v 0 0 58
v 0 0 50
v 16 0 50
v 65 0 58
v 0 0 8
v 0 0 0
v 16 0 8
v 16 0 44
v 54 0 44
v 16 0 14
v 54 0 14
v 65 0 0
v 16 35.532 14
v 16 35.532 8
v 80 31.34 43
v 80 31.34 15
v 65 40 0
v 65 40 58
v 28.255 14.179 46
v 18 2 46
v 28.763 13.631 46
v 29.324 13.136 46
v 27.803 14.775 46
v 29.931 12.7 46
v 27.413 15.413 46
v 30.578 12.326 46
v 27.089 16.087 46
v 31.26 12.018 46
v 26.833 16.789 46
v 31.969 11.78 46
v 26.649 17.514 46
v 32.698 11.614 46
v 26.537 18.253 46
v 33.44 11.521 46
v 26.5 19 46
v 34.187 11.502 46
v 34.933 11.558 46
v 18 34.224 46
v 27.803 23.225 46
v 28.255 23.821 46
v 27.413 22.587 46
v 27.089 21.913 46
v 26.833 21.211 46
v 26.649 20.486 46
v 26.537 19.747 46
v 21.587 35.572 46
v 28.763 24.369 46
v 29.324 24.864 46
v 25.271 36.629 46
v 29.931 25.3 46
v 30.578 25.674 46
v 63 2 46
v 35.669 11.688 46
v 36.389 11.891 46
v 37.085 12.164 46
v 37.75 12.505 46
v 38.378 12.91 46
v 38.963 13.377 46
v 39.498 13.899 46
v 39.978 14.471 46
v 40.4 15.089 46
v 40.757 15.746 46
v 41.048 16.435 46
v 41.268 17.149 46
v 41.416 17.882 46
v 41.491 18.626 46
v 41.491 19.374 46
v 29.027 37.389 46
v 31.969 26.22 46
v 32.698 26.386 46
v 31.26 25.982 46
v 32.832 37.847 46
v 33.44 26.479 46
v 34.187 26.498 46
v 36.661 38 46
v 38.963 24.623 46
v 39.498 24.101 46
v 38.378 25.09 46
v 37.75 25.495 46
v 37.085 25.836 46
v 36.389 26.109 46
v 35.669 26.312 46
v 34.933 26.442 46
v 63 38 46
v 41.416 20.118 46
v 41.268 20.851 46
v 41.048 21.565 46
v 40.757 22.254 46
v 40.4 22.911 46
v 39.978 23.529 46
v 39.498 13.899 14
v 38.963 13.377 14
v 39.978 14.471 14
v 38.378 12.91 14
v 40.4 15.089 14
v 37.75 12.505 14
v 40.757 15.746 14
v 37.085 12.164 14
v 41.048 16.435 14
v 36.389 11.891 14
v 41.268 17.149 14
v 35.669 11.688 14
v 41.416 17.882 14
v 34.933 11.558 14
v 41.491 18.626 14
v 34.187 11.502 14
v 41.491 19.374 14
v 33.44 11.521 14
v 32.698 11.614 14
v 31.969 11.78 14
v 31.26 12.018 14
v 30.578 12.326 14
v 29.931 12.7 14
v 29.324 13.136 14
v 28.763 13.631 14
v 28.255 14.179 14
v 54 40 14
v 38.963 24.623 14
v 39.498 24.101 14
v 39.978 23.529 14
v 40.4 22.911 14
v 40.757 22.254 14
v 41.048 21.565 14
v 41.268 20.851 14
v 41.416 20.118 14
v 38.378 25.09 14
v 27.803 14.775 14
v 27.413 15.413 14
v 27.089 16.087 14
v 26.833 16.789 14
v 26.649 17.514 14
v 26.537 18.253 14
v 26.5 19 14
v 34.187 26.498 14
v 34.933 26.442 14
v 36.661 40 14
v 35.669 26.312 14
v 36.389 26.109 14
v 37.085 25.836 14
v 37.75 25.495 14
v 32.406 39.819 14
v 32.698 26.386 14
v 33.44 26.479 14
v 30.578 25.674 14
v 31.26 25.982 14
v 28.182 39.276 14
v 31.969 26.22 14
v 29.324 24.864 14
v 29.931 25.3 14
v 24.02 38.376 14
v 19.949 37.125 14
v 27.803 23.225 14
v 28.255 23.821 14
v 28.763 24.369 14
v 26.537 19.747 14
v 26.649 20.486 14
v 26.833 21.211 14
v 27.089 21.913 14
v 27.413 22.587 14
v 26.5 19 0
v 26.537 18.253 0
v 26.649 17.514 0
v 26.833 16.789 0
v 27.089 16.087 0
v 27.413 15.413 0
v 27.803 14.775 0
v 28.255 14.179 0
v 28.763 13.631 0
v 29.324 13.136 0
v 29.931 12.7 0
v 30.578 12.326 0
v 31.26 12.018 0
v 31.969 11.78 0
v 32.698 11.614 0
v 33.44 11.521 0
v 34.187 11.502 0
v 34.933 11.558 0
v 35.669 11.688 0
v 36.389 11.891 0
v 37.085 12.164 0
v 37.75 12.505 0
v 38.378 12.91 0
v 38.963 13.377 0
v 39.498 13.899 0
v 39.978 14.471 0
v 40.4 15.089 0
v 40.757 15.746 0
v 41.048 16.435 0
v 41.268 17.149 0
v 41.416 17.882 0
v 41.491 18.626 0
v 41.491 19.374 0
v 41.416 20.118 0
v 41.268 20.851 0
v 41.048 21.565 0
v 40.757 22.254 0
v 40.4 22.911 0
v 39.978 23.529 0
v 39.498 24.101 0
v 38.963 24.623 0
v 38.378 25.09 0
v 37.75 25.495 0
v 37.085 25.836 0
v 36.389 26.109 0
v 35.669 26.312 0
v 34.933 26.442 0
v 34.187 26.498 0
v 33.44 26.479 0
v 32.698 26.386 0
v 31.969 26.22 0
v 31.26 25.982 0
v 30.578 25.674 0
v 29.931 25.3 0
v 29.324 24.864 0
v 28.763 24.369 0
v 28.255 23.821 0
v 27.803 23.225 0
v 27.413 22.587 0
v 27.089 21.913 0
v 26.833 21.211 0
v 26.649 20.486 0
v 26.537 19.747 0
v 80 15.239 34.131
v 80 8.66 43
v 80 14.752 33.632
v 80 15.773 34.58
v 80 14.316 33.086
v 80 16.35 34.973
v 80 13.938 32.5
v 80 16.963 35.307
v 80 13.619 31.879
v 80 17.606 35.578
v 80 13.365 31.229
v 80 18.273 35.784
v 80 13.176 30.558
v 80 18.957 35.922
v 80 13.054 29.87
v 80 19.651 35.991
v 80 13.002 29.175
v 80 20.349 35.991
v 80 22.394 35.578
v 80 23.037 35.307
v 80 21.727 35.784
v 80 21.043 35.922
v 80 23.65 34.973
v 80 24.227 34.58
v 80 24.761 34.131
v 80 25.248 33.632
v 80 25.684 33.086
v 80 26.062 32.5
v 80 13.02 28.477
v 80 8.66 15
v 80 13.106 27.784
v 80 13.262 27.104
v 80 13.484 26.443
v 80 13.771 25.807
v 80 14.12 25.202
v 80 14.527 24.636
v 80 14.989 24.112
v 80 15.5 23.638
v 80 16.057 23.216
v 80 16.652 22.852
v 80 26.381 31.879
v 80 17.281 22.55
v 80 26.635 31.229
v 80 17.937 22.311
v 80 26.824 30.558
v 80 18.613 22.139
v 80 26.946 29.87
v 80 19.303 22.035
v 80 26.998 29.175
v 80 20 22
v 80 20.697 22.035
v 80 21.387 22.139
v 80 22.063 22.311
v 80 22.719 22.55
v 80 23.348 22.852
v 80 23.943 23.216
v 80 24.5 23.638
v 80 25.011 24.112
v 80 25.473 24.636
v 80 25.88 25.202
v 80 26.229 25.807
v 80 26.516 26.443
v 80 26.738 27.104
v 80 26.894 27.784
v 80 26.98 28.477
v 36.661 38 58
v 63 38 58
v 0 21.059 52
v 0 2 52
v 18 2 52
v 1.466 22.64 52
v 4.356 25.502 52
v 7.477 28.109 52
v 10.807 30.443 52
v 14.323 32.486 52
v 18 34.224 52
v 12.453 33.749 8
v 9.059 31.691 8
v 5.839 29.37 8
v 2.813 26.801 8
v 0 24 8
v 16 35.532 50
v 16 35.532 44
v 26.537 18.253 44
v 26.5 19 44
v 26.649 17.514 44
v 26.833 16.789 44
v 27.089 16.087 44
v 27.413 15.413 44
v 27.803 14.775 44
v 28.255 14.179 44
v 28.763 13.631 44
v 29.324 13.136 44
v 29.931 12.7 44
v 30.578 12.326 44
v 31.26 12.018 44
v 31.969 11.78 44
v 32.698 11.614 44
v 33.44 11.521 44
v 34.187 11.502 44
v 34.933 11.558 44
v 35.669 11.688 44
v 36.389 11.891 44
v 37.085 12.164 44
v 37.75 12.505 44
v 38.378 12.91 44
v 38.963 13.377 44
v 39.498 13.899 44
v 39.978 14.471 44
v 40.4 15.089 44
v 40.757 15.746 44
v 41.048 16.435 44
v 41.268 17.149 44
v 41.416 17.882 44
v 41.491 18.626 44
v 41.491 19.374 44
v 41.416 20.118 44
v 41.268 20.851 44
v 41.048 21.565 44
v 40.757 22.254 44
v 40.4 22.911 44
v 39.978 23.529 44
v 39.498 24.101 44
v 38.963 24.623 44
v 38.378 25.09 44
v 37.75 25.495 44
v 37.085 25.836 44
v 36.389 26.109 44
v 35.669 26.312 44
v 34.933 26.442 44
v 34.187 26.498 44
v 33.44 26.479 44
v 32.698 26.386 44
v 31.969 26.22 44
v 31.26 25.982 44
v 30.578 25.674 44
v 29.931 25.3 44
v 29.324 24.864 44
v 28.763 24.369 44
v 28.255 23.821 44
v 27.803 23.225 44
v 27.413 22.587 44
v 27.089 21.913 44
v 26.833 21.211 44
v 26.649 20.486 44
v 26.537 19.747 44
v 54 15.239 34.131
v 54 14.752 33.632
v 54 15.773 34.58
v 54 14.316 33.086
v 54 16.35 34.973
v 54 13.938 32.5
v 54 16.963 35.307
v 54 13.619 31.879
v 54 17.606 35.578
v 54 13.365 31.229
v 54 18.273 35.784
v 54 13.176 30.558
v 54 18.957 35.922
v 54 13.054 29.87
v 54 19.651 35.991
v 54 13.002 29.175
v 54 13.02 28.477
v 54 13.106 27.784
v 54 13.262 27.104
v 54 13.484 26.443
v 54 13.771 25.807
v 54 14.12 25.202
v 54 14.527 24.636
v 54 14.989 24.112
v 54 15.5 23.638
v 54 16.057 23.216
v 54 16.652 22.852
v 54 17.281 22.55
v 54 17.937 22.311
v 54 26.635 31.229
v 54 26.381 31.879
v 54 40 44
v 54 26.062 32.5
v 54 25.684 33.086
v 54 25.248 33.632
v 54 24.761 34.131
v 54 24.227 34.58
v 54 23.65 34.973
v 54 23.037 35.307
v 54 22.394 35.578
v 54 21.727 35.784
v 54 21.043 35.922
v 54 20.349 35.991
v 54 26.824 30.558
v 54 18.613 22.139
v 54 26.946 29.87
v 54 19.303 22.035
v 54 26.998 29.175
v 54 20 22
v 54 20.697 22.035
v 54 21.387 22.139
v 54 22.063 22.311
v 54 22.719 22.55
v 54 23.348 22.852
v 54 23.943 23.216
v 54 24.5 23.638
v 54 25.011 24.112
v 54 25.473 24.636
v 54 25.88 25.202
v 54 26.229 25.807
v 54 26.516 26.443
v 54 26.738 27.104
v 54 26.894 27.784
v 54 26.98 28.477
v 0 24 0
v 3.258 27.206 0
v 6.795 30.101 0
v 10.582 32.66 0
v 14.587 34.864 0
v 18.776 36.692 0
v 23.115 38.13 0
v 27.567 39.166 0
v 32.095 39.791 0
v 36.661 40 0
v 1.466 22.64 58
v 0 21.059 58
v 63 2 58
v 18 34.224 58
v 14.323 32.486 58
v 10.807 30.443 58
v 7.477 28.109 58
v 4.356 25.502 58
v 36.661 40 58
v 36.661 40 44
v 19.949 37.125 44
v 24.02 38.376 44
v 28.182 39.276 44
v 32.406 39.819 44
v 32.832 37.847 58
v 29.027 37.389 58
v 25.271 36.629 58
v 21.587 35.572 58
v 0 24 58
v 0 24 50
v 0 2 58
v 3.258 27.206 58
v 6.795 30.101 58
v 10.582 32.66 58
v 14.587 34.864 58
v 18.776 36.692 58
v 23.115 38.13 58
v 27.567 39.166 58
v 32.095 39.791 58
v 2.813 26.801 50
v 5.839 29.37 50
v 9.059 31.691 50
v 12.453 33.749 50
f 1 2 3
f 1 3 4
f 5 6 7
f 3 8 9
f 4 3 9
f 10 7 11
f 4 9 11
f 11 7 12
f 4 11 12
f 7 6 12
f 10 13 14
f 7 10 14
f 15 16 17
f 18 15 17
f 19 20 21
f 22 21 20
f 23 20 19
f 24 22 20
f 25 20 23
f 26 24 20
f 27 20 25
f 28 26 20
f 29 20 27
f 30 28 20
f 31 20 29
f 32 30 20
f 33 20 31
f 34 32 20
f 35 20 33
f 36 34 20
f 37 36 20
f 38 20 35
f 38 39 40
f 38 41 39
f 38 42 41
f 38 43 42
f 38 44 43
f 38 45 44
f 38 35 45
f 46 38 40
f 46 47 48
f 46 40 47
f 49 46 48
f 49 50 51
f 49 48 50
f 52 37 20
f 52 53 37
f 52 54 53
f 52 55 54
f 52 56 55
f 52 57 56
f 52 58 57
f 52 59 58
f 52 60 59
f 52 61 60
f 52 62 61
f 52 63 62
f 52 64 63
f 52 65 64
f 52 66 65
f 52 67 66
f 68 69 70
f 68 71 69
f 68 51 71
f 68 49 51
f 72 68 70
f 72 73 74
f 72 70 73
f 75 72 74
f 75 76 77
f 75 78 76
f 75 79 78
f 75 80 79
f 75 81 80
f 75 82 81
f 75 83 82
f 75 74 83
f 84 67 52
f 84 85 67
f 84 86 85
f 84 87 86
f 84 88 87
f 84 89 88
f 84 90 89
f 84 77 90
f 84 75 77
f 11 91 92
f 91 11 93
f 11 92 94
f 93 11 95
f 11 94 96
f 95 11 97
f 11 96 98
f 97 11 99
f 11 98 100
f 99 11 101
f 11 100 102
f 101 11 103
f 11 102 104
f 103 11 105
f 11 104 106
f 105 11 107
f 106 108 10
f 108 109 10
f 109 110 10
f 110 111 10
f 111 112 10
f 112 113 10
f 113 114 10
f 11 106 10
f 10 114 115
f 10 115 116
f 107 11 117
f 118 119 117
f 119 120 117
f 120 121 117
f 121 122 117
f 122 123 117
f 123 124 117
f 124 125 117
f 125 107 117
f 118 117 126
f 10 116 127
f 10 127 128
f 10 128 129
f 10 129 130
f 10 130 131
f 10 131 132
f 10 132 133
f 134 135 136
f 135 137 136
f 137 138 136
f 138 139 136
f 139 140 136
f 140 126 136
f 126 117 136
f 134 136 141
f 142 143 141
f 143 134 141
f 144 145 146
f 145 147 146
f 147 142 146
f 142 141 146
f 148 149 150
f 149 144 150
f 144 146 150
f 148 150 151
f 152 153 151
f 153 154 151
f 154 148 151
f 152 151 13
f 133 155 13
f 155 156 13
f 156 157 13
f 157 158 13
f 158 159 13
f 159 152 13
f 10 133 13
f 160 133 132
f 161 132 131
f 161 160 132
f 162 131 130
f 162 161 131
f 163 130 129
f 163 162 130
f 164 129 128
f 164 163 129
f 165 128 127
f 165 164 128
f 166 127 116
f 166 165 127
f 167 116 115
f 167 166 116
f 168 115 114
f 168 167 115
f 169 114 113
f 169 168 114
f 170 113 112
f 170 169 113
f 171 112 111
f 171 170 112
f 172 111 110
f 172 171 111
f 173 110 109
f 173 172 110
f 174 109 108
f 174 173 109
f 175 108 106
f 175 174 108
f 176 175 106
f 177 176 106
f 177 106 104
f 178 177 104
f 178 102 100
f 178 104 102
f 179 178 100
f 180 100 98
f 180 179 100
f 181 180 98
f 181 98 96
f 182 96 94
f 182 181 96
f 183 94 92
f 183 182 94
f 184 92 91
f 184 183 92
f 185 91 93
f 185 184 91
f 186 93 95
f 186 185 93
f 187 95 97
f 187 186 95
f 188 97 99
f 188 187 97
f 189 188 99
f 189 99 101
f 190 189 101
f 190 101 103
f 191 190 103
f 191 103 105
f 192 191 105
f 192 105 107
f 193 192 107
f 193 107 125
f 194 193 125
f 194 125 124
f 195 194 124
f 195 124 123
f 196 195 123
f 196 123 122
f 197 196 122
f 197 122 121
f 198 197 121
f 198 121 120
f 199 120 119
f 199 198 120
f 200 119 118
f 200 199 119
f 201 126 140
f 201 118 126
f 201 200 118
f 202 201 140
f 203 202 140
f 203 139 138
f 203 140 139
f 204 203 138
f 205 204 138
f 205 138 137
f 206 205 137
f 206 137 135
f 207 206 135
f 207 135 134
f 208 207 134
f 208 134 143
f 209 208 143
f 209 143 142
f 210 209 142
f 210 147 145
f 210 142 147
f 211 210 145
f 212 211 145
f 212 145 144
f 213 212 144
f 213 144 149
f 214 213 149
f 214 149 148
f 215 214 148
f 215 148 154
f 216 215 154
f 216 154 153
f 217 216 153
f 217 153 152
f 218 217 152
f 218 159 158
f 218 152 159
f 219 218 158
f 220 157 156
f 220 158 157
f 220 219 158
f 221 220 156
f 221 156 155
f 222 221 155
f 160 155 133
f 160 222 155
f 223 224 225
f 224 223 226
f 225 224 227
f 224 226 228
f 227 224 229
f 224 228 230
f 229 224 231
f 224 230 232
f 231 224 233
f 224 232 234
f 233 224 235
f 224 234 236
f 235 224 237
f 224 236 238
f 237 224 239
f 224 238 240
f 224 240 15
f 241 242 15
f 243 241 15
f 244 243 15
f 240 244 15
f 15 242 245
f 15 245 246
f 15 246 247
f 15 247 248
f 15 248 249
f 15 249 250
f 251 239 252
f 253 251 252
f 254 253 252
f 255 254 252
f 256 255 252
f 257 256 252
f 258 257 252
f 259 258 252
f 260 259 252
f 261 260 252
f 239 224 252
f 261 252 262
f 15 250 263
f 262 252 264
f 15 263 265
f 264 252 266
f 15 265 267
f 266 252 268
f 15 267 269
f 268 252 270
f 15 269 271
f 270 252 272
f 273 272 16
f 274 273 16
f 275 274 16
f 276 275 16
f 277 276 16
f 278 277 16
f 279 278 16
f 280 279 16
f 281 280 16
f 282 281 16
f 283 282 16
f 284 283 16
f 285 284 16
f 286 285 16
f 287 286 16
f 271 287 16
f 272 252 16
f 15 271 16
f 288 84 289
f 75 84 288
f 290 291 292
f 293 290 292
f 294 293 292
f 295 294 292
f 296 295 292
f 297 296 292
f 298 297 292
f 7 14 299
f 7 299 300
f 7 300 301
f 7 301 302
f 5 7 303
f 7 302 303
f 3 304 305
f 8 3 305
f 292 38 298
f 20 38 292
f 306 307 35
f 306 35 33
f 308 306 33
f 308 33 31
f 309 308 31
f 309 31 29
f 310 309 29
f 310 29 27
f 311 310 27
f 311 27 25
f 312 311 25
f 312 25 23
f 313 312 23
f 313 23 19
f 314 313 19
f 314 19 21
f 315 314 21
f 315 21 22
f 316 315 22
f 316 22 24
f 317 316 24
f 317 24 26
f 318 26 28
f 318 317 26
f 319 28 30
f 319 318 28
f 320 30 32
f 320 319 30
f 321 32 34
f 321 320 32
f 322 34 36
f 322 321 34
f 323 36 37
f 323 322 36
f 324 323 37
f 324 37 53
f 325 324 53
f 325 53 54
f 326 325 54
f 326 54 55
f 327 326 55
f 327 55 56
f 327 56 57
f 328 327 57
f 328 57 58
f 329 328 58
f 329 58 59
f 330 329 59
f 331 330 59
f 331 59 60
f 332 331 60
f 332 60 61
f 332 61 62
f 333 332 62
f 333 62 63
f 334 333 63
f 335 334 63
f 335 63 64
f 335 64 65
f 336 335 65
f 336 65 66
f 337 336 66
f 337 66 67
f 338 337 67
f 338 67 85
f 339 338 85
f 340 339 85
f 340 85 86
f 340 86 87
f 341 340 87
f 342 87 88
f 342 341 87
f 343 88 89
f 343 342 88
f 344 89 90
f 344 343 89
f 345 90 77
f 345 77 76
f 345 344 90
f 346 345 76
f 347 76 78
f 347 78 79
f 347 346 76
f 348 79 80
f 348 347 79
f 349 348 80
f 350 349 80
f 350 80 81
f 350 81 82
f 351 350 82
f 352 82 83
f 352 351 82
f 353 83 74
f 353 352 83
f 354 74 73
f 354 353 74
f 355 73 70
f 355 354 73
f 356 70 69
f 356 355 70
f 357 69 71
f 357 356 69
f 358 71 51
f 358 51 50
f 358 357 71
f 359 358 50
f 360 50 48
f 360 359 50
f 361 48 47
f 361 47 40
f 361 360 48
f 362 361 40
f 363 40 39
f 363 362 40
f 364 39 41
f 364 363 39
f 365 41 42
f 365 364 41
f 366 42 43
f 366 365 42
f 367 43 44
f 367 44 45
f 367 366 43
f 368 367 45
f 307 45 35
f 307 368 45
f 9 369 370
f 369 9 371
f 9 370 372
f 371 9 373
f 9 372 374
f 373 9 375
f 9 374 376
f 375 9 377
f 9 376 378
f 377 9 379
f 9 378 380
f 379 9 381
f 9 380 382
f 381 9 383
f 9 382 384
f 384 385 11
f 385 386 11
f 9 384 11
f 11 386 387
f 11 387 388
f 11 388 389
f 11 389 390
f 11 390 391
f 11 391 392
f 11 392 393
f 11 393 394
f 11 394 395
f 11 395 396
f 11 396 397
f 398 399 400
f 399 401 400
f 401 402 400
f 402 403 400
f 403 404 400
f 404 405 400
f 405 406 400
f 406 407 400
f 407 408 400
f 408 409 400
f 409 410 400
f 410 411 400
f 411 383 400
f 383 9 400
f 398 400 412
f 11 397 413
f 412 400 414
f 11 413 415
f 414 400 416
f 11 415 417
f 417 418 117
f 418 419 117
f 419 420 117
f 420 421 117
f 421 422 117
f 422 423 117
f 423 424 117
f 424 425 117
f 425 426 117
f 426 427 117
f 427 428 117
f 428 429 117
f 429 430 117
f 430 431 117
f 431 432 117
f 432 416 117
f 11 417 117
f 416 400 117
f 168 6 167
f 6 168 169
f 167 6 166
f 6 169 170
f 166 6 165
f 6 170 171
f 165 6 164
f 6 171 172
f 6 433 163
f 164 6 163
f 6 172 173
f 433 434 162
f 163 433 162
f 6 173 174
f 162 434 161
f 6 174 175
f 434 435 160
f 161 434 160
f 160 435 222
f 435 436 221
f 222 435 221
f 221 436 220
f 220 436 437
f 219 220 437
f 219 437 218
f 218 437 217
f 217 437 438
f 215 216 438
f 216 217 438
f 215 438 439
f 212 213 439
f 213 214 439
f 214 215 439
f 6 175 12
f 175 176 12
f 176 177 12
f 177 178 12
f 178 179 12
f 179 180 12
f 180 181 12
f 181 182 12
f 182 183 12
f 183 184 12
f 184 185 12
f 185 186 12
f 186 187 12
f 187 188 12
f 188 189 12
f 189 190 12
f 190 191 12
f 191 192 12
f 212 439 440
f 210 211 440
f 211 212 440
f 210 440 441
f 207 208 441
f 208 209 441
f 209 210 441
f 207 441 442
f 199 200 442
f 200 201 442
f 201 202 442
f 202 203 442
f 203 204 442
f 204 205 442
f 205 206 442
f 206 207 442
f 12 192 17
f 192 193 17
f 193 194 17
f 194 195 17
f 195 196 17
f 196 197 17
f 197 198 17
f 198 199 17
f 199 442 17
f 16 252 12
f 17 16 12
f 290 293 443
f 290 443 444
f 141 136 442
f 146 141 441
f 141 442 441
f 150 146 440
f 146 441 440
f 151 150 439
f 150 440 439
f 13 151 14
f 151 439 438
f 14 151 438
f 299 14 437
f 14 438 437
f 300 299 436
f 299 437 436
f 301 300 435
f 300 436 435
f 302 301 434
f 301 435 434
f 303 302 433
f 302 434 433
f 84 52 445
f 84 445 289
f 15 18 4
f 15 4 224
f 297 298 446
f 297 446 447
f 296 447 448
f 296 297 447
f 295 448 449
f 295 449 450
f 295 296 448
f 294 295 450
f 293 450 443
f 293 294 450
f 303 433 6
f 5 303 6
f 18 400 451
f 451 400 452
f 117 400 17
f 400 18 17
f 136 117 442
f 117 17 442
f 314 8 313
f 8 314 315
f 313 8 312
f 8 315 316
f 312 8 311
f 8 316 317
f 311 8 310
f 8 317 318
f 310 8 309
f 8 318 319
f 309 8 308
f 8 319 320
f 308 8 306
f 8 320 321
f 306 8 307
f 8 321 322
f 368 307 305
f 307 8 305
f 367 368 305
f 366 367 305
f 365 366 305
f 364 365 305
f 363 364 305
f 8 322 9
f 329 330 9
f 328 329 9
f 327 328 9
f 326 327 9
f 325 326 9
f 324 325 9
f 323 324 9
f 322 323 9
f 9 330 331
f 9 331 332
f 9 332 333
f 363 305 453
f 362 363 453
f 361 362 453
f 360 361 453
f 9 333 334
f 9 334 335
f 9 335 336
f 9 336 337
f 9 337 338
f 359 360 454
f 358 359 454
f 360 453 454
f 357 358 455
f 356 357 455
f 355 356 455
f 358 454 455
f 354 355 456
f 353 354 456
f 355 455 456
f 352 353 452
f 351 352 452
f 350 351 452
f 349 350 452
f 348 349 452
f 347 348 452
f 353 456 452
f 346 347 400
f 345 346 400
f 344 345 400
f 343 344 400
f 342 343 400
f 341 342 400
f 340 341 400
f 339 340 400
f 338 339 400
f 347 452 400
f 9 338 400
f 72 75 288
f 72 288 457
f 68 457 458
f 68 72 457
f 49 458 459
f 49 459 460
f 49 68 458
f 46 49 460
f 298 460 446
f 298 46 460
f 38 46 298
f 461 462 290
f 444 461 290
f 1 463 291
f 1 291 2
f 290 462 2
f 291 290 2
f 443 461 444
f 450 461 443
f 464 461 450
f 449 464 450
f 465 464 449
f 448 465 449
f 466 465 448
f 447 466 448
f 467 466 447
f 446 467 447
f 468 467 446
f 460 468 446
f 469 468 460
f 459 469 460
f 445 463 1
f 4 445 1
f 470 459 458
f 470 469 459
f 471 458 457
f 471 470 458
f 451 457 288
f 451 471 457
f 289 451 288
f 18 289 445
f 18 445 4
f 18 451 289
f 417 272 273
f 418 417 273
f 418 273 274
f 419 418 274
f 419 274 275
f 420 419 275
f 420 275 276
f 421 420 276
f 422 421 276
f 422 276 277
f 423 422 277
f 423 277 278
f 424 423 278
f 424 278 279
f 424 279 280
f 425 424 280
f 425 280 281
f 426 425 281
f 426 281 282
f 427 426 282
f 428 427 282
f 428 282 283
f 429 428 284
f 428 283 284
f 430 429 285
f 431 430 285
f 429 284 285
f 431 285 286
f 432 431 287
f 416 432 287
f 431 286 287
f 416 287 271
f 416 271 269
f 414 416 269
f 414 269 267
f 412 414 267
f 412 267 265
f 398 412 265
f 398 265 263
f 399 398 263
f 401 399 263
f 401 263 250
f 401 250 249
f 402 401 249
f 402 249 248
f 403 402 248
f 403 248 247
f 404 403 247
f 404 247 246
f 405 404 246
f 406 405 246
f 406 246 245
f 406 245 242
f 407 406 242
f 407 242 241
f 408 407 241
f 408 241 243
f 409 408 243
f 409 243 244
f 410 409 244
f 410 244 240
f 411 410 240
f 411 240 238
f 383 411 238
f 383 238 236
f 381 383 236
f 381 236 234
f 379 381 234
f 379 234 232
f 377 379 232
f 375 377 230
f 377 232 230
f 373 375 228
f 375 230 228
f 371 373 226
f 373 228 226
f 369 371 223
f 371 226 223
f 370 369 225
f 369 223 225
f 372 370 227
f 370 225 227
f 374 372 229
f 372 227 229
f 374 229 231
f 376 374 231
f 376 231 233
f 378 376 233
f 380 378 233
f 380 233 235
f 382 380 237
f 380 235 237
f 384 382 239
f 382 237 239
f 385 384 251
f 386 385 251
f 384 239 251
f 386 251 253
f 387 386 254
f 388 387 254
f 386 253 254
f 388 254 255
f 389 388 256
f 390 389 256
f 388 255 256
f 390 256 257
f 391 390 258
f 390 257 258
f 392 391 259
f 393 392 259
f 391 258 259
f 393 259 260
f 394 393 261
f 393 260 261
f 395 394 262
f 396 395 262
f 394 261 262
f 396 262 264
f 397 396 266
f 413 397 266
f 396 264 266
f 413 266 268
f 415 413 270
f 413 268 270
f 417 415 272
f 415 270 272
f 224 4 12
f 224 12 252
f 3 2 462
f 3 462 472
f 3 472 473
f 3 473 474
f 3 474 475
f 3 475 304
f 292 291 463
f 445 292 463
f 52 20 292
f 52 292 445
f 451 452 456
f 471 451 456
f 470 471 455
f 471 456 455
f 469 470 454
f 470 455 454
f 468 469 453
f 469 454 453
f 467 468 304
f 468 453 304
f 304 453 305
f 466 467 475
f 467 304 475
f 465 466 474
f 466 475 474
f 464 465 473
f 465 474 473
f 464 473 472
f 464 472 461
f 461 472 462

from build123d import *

# Parameters (mm, degrees)
SKETCH1_R           = 7.5
BOSS_EXTRUDE1_DEPTH = 58
CUT_EXTRUDE1_DEPTH  = 107.60206377
SKETCH3_R           = 7
CUT_EXTRUDE2_DEPTH  = 107.60206377
SKETCH5_W           = 17.33939444
SKETCH5_H           = 15
CUT_EXTRUDE3_DEPTH  = 107.602063899
CUT_EXTRUDE4_START  = -12
SKETCH6_R           = 7.5
CUT_EXTRUDE4_DEPTH  = 12
CUT_EXTRUDE5_START  = -6
CUT_EXTRUDE5_DEPTH  = 6


with BuildPart() as part:
    # Sketch1 → Boss-Extrude1 (new body)
    with BuildSketch(Plane.XY):
        with BuildLine():
            Line((0, 0), (65, 0))
            Line((65, 0), (80, 8.660254038))
            Line((80, 8.660254038), (80, 31.339745962))
            Line((80, 31.339745962), (65, 40))
            Line((65, 40), (36.66060556, 40))
            ThreePointArc((36.66060556, 40), (16.66060556, 35.82575695), (0, 24))
            Line((0, 24), (0, 0))
        make_face()
        with Locations(Location((34, 19, 0), (0, 0, 180))):
            Circle(SKETCH1_R, mode=Mode.SUBTRACT)
    extrude(amount=BOSS_EXTRUDE1_DEPTH)

    # Sketch2 → Cut-Extrude1 (cut, through all)
    with BuildSketch(Plane.XZ):
        Polygon((80, 58), (65, 58), (80, 43), align=None)
        Polygon((80, 15), (65, 0), (80, 0), align=None)
    extrude(amount=-CUT_EXTRUDE1_DEPTH, mode=Mode.SUBTRACT)

    # Sketch3 → Cut-Extrude2 (cut, through all)
    with BuildSketch(Plane(origin=(80, 0, 0), x_dir=(0, 0, -1), z_dir=(1, 0, 0))):
        with Locations((-29, 20)):
            Circle(SKETCH3_R)
    extrude(amount=-CUT_EXTRUDE2_DEPTH, mode=Mode.SUBTRACT)

    # Sketch5 → Cut-Extrude3 (cut, through all)
    with BuildSketch(Plane(origin=(0, 40, 0), x_dir=(1, 0, 0), z_dir=(0, 1, 0))):
        Polygon((16, -8), (0, -8), (0, -29), (36.66060556, -29), (36.66060556, -14), (16, -14), align=None)
        with Locations((45.33030278, -21.5)):
            Rectangle(SKETCH5_W, SKETCH5_H)
        with Locations((45.33030278, -36.5)):
            Rectangle(SKETCH5_W, SKETCH5_H)
        Polygon((36.66060556, -29), (0, -29), (0, -50), (16, -50), (16, -44), (36.66060556, -44), align=None)
    extrude(amount=-CUT_EXTRUDE3_DEPTH, mode=Mode.SUBTRACT)

    # Sketch6 → Cut-Extrude4 (cut)
    with BuildSketch(Plane.XY.offset(58).offset(CUT_EXTRUDE4_START)):
        with BuildLine():
            Line((18, 34.224221872), (18, 2))
            Line((18, 2), (63, 2))
            Line((63, 2), (63, 38))
            Line((63, 38), (36.66060556, 38))
            ThreePointArc((36.66060556, 38), (27.141221384, 37.046586751), (18, 34.224221872))
        make_face()
        with Locations(Location((34, 19, 0), (0, 0, 180))):
            Circle(SKETCH6_R, mode=Mode.SUBTRACT)
    extrude(amount=CUT_EXTRUDE4_DEPTH, mode=Mode.SUBTRACT)

    # Sketch7 → Cut-Extrude5 (cut)
    with BuildSketch(Plane.XY.offset(58).offset(CUT_EXTRUDE5_START)):
        with BuildLine():
            Line((18, 2), (18, 34.224221872))
            ThreePointArc((18, 34.224221872), (9.117311148, 29.311155325), (1.466424222, 22.64))
            Line((1.466424222, 22.64), (0, 21.058823529))
            Line((0, 21.058823529), (0, 2))
            Line((0, 2), (18, 2))
        make_face()
    extrude(amount=CUT_EXTRUDE5_DEPTH, mode=Mode.SUBTRACT)


solid = part.part
